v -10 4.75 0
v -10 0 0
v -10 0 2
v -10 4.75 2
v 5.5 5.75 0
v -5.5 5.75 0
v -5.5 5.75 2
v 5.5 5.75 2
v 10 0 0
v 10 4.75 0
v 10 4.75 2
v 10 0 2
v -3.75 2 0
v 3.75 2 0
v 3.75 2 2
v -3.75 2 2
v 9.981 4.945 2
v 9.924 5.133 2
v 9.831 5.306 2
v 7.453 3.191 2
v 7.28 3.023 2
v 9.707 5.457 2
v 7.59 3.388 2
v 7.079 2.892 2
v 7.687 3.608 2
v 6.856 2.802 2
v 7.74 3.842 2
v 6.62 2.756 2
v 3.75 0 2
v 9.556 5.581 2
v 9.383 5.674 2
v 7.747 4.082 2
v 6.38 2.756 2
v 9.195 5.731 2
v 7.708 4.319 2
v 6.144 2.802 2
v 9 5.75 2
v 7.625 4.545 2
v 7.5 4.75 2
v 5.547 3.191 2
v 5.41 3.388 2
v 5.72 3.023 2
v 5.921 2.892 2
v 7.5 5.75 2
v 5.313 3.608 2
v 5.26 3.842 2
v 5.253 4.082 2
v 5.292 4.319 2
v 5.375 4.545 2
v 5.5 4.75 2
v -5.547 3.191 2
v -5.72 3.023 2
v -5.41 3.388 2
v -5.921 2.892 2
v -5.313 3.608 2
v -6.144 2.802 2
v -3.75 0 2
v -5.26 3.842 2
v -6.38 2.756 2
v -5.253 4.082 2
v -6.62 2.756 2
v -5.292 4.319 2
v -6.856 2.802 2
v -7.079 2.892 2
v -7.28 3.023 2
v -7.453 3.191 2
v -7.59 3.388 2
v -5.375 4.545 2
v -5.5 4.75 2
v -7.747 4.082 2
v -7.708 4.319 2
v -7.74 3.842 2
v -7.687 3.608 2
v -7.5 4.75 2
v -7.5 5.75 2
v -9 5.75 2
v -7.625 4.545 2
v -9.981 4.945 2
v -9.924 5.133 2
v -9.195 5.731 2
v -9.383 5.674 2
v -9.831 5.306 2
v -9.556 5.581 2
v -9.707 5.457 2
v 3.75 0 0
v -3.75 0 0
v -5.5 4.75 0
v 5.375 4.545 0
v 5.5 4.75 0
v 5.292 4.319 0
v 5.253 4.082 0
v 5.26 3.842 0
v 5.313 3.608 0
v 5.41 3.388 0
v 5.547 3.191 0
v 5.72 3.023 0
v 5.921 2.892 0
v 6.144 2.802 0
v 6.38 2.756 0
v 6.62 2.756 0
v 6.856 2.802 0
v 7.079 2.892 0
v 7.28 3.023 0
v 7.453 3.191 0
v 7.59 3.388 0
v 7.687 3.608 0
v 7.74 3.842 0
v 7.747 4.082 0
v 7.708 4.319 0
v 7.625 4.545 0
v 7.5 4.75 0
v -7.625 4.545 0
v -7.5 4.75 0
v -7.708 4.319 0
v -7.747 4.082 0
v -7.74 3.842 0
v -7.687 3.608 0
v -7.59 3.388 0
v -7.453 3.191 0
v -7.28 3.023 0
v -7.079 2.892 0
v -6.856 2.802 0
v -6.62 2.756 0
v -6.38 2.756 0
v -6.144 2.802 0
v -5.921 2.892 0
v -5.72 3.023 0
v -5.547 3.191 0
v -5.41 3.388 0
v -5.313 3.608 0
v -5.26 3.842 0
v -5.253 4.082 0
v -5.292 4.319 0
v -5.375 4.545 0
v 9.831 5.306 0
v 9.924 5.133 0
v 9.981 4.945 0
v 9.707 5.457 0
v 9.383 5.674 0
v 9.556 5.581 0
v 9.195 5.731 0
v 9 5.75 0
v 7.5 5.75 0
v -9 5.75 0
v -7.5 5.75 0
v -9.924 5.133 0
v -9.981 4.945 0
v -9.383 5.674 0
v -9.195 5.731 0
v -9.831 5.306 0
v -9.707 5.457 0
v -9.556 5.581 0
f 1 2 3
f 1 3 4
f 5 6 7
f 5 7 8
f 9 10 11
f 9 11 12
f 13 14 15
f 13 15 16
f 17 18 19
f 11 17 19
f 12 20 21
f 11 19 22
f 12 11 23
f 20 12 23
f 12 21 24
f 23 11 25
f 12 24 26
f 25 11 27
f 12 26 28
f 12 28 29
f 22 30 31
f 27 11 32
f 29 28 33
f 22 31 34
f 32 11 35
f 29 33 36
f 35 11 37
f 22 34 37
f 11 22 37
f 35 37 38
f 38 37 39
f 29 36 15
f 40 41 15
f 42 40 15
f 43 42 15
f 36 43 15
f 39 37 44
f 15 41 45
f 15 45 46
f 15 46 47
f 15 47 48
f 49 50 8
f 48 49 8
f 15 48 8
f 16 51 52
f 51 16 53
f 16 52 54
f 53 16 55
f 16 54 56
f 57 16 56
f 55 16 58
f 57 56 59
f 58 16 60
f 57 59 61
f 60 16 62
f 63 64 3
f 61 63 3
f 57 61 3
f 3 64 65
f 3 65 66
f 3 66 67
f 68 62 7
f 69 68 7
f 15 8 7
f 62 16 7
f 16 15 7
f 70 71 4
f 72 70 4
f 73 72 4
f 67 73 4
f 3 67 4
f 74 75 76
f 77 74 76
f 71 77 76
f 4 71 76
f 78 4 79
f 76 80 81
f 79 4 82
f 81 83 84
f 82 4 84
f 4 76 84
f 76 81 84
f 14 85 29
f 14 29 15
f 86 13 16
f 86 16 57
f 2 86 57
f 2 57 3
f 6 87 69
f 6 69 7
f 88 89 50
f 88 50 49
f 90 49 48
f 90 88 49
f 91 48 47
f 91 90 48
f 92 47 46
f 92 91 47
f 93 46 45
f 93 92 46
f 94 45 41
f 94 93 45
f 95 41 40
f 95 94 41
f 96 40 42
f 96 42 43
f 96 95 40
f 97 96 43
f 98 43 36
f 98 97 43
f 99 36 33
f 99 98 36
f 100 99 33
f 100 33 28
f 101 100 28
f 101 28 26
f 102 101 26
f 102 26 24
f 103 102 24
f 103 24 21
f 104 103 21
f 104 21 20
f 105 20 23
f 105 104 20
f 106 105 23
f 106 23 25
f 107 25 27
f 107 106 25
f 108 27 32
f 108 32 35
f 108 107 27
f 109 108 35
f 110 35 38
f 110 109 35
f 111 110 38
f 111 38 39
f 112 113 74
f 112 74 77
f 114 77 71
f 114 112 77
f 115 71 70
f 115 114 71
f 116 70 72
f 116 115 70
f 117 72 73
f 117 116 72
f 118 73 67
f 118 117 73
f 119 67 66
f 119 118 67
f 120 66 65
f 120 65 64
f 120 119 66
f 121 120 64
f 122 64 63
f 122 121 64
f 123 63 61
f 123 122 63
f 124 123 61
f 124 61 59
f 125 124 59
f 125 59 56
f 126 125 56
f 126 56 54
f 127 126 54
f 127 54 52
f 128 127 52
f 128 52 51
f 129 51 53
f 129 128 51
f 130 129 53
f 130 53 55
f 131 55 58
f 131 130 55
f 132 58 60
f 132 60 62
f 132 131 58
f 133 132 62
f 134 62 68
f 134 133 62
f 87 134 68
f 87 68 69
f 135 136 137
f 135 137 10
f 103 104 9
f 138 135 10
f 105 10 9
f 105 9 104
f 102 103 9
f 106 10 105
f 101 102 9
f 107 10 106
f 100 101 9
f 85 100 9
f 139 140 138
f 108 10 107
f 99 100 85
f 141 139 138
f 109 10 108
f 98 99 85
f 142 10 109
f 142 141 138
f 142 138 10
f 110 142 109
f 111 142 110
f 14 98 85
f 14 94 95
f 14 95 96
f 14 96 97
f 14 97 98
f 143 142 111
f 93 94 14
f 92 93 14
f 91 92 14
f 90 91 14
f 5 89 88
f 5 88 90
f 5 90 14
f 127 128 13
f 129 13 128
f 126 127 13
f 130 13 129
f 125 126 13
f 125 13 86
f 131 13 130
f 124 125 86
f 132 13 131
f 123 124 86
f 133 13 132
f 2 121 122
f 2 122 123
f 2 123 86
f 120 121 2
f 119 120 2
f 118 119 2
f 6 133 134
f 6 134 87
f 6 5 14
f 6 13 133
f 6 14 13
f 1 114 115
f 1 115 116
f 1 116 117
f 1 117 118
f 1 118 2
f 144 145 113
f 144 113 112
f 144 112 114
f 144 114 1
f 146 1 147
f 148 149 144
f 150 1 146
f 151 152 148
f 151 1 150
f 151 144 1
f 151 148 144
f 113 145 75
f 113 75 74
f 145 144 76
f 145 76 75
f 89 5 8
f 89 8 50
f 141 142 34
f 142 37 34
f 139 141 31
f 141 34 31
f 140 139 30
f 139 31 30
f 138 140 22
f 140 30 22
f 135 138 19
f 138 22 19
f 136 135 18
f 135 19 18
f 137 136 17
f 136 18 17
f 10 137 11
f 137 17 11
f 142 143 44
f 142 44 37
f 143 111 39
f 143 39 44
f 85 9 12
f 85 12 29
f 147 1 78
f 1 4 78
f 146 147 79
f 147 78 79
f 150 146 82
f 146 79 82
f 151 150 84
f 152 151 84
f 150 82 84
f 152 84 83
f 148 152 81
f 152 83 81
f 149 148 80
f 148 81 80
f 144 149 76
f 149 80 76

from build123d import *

# Parameters (mm, degrees)
TUBE_PLATE_BODY_DEPTH   = 2
TUBE_PLATE_CONTOURING_R = 1


with BuildPart() as part:
    # Sketch1 → Tube Plate Body (new body)
    with BuildSketch(Plane.XY):
        with BuildLine():
            Line((-10, 0), (-10, 5.75))
            Line((-10, 5.75), (-7.5, 5.75))
            Line((-7.5, 5.75), (-7.5, 4.75))
            ThreePointArc((-7.5, 4.75), (-6.5, 2.75), (-5.5, 4.75))
            Line((-5.5, 4.75), (-5.5, 5.75))
            Line((-5.5, 5.75), (5.5, 5.75))
            Line((5.5, 5.75), (5.5, 4.75))
            ThreePointArc((5.5, 4.75), (6.5, 2.75), (7.5, 4.75))
            Line((7.5, 4.75), (7.5, 5.75))
            Line((7.5, 5.75), (10, 5.75))
            Line((10, 5.75), (10, 0))
            Line((10, 0), (3.75, 0))
            Line((3.75, 0), (3.75, 2))
            Line((3.75, 2), (-3.75, 2))
            Line((-3.75, 2), (-3.75, 0))
            Line((-3.75, 0), (-10, 0))
        make_face()
    extrude(amount=TUBE_PLATE_BODY_DEPTH)

    # Tube Plate Contouring
    tube_plate_contouring_edges = [part.edges().sort_by_distance(p)[0] for p in [
        (-10, 5.75, 1),
        (10, 5.75, 1),
    ]]
    fillet(tube_plate_contouring_edges, radius=TUBE_PLATE_CONTOURING_R)


solid = part.part
